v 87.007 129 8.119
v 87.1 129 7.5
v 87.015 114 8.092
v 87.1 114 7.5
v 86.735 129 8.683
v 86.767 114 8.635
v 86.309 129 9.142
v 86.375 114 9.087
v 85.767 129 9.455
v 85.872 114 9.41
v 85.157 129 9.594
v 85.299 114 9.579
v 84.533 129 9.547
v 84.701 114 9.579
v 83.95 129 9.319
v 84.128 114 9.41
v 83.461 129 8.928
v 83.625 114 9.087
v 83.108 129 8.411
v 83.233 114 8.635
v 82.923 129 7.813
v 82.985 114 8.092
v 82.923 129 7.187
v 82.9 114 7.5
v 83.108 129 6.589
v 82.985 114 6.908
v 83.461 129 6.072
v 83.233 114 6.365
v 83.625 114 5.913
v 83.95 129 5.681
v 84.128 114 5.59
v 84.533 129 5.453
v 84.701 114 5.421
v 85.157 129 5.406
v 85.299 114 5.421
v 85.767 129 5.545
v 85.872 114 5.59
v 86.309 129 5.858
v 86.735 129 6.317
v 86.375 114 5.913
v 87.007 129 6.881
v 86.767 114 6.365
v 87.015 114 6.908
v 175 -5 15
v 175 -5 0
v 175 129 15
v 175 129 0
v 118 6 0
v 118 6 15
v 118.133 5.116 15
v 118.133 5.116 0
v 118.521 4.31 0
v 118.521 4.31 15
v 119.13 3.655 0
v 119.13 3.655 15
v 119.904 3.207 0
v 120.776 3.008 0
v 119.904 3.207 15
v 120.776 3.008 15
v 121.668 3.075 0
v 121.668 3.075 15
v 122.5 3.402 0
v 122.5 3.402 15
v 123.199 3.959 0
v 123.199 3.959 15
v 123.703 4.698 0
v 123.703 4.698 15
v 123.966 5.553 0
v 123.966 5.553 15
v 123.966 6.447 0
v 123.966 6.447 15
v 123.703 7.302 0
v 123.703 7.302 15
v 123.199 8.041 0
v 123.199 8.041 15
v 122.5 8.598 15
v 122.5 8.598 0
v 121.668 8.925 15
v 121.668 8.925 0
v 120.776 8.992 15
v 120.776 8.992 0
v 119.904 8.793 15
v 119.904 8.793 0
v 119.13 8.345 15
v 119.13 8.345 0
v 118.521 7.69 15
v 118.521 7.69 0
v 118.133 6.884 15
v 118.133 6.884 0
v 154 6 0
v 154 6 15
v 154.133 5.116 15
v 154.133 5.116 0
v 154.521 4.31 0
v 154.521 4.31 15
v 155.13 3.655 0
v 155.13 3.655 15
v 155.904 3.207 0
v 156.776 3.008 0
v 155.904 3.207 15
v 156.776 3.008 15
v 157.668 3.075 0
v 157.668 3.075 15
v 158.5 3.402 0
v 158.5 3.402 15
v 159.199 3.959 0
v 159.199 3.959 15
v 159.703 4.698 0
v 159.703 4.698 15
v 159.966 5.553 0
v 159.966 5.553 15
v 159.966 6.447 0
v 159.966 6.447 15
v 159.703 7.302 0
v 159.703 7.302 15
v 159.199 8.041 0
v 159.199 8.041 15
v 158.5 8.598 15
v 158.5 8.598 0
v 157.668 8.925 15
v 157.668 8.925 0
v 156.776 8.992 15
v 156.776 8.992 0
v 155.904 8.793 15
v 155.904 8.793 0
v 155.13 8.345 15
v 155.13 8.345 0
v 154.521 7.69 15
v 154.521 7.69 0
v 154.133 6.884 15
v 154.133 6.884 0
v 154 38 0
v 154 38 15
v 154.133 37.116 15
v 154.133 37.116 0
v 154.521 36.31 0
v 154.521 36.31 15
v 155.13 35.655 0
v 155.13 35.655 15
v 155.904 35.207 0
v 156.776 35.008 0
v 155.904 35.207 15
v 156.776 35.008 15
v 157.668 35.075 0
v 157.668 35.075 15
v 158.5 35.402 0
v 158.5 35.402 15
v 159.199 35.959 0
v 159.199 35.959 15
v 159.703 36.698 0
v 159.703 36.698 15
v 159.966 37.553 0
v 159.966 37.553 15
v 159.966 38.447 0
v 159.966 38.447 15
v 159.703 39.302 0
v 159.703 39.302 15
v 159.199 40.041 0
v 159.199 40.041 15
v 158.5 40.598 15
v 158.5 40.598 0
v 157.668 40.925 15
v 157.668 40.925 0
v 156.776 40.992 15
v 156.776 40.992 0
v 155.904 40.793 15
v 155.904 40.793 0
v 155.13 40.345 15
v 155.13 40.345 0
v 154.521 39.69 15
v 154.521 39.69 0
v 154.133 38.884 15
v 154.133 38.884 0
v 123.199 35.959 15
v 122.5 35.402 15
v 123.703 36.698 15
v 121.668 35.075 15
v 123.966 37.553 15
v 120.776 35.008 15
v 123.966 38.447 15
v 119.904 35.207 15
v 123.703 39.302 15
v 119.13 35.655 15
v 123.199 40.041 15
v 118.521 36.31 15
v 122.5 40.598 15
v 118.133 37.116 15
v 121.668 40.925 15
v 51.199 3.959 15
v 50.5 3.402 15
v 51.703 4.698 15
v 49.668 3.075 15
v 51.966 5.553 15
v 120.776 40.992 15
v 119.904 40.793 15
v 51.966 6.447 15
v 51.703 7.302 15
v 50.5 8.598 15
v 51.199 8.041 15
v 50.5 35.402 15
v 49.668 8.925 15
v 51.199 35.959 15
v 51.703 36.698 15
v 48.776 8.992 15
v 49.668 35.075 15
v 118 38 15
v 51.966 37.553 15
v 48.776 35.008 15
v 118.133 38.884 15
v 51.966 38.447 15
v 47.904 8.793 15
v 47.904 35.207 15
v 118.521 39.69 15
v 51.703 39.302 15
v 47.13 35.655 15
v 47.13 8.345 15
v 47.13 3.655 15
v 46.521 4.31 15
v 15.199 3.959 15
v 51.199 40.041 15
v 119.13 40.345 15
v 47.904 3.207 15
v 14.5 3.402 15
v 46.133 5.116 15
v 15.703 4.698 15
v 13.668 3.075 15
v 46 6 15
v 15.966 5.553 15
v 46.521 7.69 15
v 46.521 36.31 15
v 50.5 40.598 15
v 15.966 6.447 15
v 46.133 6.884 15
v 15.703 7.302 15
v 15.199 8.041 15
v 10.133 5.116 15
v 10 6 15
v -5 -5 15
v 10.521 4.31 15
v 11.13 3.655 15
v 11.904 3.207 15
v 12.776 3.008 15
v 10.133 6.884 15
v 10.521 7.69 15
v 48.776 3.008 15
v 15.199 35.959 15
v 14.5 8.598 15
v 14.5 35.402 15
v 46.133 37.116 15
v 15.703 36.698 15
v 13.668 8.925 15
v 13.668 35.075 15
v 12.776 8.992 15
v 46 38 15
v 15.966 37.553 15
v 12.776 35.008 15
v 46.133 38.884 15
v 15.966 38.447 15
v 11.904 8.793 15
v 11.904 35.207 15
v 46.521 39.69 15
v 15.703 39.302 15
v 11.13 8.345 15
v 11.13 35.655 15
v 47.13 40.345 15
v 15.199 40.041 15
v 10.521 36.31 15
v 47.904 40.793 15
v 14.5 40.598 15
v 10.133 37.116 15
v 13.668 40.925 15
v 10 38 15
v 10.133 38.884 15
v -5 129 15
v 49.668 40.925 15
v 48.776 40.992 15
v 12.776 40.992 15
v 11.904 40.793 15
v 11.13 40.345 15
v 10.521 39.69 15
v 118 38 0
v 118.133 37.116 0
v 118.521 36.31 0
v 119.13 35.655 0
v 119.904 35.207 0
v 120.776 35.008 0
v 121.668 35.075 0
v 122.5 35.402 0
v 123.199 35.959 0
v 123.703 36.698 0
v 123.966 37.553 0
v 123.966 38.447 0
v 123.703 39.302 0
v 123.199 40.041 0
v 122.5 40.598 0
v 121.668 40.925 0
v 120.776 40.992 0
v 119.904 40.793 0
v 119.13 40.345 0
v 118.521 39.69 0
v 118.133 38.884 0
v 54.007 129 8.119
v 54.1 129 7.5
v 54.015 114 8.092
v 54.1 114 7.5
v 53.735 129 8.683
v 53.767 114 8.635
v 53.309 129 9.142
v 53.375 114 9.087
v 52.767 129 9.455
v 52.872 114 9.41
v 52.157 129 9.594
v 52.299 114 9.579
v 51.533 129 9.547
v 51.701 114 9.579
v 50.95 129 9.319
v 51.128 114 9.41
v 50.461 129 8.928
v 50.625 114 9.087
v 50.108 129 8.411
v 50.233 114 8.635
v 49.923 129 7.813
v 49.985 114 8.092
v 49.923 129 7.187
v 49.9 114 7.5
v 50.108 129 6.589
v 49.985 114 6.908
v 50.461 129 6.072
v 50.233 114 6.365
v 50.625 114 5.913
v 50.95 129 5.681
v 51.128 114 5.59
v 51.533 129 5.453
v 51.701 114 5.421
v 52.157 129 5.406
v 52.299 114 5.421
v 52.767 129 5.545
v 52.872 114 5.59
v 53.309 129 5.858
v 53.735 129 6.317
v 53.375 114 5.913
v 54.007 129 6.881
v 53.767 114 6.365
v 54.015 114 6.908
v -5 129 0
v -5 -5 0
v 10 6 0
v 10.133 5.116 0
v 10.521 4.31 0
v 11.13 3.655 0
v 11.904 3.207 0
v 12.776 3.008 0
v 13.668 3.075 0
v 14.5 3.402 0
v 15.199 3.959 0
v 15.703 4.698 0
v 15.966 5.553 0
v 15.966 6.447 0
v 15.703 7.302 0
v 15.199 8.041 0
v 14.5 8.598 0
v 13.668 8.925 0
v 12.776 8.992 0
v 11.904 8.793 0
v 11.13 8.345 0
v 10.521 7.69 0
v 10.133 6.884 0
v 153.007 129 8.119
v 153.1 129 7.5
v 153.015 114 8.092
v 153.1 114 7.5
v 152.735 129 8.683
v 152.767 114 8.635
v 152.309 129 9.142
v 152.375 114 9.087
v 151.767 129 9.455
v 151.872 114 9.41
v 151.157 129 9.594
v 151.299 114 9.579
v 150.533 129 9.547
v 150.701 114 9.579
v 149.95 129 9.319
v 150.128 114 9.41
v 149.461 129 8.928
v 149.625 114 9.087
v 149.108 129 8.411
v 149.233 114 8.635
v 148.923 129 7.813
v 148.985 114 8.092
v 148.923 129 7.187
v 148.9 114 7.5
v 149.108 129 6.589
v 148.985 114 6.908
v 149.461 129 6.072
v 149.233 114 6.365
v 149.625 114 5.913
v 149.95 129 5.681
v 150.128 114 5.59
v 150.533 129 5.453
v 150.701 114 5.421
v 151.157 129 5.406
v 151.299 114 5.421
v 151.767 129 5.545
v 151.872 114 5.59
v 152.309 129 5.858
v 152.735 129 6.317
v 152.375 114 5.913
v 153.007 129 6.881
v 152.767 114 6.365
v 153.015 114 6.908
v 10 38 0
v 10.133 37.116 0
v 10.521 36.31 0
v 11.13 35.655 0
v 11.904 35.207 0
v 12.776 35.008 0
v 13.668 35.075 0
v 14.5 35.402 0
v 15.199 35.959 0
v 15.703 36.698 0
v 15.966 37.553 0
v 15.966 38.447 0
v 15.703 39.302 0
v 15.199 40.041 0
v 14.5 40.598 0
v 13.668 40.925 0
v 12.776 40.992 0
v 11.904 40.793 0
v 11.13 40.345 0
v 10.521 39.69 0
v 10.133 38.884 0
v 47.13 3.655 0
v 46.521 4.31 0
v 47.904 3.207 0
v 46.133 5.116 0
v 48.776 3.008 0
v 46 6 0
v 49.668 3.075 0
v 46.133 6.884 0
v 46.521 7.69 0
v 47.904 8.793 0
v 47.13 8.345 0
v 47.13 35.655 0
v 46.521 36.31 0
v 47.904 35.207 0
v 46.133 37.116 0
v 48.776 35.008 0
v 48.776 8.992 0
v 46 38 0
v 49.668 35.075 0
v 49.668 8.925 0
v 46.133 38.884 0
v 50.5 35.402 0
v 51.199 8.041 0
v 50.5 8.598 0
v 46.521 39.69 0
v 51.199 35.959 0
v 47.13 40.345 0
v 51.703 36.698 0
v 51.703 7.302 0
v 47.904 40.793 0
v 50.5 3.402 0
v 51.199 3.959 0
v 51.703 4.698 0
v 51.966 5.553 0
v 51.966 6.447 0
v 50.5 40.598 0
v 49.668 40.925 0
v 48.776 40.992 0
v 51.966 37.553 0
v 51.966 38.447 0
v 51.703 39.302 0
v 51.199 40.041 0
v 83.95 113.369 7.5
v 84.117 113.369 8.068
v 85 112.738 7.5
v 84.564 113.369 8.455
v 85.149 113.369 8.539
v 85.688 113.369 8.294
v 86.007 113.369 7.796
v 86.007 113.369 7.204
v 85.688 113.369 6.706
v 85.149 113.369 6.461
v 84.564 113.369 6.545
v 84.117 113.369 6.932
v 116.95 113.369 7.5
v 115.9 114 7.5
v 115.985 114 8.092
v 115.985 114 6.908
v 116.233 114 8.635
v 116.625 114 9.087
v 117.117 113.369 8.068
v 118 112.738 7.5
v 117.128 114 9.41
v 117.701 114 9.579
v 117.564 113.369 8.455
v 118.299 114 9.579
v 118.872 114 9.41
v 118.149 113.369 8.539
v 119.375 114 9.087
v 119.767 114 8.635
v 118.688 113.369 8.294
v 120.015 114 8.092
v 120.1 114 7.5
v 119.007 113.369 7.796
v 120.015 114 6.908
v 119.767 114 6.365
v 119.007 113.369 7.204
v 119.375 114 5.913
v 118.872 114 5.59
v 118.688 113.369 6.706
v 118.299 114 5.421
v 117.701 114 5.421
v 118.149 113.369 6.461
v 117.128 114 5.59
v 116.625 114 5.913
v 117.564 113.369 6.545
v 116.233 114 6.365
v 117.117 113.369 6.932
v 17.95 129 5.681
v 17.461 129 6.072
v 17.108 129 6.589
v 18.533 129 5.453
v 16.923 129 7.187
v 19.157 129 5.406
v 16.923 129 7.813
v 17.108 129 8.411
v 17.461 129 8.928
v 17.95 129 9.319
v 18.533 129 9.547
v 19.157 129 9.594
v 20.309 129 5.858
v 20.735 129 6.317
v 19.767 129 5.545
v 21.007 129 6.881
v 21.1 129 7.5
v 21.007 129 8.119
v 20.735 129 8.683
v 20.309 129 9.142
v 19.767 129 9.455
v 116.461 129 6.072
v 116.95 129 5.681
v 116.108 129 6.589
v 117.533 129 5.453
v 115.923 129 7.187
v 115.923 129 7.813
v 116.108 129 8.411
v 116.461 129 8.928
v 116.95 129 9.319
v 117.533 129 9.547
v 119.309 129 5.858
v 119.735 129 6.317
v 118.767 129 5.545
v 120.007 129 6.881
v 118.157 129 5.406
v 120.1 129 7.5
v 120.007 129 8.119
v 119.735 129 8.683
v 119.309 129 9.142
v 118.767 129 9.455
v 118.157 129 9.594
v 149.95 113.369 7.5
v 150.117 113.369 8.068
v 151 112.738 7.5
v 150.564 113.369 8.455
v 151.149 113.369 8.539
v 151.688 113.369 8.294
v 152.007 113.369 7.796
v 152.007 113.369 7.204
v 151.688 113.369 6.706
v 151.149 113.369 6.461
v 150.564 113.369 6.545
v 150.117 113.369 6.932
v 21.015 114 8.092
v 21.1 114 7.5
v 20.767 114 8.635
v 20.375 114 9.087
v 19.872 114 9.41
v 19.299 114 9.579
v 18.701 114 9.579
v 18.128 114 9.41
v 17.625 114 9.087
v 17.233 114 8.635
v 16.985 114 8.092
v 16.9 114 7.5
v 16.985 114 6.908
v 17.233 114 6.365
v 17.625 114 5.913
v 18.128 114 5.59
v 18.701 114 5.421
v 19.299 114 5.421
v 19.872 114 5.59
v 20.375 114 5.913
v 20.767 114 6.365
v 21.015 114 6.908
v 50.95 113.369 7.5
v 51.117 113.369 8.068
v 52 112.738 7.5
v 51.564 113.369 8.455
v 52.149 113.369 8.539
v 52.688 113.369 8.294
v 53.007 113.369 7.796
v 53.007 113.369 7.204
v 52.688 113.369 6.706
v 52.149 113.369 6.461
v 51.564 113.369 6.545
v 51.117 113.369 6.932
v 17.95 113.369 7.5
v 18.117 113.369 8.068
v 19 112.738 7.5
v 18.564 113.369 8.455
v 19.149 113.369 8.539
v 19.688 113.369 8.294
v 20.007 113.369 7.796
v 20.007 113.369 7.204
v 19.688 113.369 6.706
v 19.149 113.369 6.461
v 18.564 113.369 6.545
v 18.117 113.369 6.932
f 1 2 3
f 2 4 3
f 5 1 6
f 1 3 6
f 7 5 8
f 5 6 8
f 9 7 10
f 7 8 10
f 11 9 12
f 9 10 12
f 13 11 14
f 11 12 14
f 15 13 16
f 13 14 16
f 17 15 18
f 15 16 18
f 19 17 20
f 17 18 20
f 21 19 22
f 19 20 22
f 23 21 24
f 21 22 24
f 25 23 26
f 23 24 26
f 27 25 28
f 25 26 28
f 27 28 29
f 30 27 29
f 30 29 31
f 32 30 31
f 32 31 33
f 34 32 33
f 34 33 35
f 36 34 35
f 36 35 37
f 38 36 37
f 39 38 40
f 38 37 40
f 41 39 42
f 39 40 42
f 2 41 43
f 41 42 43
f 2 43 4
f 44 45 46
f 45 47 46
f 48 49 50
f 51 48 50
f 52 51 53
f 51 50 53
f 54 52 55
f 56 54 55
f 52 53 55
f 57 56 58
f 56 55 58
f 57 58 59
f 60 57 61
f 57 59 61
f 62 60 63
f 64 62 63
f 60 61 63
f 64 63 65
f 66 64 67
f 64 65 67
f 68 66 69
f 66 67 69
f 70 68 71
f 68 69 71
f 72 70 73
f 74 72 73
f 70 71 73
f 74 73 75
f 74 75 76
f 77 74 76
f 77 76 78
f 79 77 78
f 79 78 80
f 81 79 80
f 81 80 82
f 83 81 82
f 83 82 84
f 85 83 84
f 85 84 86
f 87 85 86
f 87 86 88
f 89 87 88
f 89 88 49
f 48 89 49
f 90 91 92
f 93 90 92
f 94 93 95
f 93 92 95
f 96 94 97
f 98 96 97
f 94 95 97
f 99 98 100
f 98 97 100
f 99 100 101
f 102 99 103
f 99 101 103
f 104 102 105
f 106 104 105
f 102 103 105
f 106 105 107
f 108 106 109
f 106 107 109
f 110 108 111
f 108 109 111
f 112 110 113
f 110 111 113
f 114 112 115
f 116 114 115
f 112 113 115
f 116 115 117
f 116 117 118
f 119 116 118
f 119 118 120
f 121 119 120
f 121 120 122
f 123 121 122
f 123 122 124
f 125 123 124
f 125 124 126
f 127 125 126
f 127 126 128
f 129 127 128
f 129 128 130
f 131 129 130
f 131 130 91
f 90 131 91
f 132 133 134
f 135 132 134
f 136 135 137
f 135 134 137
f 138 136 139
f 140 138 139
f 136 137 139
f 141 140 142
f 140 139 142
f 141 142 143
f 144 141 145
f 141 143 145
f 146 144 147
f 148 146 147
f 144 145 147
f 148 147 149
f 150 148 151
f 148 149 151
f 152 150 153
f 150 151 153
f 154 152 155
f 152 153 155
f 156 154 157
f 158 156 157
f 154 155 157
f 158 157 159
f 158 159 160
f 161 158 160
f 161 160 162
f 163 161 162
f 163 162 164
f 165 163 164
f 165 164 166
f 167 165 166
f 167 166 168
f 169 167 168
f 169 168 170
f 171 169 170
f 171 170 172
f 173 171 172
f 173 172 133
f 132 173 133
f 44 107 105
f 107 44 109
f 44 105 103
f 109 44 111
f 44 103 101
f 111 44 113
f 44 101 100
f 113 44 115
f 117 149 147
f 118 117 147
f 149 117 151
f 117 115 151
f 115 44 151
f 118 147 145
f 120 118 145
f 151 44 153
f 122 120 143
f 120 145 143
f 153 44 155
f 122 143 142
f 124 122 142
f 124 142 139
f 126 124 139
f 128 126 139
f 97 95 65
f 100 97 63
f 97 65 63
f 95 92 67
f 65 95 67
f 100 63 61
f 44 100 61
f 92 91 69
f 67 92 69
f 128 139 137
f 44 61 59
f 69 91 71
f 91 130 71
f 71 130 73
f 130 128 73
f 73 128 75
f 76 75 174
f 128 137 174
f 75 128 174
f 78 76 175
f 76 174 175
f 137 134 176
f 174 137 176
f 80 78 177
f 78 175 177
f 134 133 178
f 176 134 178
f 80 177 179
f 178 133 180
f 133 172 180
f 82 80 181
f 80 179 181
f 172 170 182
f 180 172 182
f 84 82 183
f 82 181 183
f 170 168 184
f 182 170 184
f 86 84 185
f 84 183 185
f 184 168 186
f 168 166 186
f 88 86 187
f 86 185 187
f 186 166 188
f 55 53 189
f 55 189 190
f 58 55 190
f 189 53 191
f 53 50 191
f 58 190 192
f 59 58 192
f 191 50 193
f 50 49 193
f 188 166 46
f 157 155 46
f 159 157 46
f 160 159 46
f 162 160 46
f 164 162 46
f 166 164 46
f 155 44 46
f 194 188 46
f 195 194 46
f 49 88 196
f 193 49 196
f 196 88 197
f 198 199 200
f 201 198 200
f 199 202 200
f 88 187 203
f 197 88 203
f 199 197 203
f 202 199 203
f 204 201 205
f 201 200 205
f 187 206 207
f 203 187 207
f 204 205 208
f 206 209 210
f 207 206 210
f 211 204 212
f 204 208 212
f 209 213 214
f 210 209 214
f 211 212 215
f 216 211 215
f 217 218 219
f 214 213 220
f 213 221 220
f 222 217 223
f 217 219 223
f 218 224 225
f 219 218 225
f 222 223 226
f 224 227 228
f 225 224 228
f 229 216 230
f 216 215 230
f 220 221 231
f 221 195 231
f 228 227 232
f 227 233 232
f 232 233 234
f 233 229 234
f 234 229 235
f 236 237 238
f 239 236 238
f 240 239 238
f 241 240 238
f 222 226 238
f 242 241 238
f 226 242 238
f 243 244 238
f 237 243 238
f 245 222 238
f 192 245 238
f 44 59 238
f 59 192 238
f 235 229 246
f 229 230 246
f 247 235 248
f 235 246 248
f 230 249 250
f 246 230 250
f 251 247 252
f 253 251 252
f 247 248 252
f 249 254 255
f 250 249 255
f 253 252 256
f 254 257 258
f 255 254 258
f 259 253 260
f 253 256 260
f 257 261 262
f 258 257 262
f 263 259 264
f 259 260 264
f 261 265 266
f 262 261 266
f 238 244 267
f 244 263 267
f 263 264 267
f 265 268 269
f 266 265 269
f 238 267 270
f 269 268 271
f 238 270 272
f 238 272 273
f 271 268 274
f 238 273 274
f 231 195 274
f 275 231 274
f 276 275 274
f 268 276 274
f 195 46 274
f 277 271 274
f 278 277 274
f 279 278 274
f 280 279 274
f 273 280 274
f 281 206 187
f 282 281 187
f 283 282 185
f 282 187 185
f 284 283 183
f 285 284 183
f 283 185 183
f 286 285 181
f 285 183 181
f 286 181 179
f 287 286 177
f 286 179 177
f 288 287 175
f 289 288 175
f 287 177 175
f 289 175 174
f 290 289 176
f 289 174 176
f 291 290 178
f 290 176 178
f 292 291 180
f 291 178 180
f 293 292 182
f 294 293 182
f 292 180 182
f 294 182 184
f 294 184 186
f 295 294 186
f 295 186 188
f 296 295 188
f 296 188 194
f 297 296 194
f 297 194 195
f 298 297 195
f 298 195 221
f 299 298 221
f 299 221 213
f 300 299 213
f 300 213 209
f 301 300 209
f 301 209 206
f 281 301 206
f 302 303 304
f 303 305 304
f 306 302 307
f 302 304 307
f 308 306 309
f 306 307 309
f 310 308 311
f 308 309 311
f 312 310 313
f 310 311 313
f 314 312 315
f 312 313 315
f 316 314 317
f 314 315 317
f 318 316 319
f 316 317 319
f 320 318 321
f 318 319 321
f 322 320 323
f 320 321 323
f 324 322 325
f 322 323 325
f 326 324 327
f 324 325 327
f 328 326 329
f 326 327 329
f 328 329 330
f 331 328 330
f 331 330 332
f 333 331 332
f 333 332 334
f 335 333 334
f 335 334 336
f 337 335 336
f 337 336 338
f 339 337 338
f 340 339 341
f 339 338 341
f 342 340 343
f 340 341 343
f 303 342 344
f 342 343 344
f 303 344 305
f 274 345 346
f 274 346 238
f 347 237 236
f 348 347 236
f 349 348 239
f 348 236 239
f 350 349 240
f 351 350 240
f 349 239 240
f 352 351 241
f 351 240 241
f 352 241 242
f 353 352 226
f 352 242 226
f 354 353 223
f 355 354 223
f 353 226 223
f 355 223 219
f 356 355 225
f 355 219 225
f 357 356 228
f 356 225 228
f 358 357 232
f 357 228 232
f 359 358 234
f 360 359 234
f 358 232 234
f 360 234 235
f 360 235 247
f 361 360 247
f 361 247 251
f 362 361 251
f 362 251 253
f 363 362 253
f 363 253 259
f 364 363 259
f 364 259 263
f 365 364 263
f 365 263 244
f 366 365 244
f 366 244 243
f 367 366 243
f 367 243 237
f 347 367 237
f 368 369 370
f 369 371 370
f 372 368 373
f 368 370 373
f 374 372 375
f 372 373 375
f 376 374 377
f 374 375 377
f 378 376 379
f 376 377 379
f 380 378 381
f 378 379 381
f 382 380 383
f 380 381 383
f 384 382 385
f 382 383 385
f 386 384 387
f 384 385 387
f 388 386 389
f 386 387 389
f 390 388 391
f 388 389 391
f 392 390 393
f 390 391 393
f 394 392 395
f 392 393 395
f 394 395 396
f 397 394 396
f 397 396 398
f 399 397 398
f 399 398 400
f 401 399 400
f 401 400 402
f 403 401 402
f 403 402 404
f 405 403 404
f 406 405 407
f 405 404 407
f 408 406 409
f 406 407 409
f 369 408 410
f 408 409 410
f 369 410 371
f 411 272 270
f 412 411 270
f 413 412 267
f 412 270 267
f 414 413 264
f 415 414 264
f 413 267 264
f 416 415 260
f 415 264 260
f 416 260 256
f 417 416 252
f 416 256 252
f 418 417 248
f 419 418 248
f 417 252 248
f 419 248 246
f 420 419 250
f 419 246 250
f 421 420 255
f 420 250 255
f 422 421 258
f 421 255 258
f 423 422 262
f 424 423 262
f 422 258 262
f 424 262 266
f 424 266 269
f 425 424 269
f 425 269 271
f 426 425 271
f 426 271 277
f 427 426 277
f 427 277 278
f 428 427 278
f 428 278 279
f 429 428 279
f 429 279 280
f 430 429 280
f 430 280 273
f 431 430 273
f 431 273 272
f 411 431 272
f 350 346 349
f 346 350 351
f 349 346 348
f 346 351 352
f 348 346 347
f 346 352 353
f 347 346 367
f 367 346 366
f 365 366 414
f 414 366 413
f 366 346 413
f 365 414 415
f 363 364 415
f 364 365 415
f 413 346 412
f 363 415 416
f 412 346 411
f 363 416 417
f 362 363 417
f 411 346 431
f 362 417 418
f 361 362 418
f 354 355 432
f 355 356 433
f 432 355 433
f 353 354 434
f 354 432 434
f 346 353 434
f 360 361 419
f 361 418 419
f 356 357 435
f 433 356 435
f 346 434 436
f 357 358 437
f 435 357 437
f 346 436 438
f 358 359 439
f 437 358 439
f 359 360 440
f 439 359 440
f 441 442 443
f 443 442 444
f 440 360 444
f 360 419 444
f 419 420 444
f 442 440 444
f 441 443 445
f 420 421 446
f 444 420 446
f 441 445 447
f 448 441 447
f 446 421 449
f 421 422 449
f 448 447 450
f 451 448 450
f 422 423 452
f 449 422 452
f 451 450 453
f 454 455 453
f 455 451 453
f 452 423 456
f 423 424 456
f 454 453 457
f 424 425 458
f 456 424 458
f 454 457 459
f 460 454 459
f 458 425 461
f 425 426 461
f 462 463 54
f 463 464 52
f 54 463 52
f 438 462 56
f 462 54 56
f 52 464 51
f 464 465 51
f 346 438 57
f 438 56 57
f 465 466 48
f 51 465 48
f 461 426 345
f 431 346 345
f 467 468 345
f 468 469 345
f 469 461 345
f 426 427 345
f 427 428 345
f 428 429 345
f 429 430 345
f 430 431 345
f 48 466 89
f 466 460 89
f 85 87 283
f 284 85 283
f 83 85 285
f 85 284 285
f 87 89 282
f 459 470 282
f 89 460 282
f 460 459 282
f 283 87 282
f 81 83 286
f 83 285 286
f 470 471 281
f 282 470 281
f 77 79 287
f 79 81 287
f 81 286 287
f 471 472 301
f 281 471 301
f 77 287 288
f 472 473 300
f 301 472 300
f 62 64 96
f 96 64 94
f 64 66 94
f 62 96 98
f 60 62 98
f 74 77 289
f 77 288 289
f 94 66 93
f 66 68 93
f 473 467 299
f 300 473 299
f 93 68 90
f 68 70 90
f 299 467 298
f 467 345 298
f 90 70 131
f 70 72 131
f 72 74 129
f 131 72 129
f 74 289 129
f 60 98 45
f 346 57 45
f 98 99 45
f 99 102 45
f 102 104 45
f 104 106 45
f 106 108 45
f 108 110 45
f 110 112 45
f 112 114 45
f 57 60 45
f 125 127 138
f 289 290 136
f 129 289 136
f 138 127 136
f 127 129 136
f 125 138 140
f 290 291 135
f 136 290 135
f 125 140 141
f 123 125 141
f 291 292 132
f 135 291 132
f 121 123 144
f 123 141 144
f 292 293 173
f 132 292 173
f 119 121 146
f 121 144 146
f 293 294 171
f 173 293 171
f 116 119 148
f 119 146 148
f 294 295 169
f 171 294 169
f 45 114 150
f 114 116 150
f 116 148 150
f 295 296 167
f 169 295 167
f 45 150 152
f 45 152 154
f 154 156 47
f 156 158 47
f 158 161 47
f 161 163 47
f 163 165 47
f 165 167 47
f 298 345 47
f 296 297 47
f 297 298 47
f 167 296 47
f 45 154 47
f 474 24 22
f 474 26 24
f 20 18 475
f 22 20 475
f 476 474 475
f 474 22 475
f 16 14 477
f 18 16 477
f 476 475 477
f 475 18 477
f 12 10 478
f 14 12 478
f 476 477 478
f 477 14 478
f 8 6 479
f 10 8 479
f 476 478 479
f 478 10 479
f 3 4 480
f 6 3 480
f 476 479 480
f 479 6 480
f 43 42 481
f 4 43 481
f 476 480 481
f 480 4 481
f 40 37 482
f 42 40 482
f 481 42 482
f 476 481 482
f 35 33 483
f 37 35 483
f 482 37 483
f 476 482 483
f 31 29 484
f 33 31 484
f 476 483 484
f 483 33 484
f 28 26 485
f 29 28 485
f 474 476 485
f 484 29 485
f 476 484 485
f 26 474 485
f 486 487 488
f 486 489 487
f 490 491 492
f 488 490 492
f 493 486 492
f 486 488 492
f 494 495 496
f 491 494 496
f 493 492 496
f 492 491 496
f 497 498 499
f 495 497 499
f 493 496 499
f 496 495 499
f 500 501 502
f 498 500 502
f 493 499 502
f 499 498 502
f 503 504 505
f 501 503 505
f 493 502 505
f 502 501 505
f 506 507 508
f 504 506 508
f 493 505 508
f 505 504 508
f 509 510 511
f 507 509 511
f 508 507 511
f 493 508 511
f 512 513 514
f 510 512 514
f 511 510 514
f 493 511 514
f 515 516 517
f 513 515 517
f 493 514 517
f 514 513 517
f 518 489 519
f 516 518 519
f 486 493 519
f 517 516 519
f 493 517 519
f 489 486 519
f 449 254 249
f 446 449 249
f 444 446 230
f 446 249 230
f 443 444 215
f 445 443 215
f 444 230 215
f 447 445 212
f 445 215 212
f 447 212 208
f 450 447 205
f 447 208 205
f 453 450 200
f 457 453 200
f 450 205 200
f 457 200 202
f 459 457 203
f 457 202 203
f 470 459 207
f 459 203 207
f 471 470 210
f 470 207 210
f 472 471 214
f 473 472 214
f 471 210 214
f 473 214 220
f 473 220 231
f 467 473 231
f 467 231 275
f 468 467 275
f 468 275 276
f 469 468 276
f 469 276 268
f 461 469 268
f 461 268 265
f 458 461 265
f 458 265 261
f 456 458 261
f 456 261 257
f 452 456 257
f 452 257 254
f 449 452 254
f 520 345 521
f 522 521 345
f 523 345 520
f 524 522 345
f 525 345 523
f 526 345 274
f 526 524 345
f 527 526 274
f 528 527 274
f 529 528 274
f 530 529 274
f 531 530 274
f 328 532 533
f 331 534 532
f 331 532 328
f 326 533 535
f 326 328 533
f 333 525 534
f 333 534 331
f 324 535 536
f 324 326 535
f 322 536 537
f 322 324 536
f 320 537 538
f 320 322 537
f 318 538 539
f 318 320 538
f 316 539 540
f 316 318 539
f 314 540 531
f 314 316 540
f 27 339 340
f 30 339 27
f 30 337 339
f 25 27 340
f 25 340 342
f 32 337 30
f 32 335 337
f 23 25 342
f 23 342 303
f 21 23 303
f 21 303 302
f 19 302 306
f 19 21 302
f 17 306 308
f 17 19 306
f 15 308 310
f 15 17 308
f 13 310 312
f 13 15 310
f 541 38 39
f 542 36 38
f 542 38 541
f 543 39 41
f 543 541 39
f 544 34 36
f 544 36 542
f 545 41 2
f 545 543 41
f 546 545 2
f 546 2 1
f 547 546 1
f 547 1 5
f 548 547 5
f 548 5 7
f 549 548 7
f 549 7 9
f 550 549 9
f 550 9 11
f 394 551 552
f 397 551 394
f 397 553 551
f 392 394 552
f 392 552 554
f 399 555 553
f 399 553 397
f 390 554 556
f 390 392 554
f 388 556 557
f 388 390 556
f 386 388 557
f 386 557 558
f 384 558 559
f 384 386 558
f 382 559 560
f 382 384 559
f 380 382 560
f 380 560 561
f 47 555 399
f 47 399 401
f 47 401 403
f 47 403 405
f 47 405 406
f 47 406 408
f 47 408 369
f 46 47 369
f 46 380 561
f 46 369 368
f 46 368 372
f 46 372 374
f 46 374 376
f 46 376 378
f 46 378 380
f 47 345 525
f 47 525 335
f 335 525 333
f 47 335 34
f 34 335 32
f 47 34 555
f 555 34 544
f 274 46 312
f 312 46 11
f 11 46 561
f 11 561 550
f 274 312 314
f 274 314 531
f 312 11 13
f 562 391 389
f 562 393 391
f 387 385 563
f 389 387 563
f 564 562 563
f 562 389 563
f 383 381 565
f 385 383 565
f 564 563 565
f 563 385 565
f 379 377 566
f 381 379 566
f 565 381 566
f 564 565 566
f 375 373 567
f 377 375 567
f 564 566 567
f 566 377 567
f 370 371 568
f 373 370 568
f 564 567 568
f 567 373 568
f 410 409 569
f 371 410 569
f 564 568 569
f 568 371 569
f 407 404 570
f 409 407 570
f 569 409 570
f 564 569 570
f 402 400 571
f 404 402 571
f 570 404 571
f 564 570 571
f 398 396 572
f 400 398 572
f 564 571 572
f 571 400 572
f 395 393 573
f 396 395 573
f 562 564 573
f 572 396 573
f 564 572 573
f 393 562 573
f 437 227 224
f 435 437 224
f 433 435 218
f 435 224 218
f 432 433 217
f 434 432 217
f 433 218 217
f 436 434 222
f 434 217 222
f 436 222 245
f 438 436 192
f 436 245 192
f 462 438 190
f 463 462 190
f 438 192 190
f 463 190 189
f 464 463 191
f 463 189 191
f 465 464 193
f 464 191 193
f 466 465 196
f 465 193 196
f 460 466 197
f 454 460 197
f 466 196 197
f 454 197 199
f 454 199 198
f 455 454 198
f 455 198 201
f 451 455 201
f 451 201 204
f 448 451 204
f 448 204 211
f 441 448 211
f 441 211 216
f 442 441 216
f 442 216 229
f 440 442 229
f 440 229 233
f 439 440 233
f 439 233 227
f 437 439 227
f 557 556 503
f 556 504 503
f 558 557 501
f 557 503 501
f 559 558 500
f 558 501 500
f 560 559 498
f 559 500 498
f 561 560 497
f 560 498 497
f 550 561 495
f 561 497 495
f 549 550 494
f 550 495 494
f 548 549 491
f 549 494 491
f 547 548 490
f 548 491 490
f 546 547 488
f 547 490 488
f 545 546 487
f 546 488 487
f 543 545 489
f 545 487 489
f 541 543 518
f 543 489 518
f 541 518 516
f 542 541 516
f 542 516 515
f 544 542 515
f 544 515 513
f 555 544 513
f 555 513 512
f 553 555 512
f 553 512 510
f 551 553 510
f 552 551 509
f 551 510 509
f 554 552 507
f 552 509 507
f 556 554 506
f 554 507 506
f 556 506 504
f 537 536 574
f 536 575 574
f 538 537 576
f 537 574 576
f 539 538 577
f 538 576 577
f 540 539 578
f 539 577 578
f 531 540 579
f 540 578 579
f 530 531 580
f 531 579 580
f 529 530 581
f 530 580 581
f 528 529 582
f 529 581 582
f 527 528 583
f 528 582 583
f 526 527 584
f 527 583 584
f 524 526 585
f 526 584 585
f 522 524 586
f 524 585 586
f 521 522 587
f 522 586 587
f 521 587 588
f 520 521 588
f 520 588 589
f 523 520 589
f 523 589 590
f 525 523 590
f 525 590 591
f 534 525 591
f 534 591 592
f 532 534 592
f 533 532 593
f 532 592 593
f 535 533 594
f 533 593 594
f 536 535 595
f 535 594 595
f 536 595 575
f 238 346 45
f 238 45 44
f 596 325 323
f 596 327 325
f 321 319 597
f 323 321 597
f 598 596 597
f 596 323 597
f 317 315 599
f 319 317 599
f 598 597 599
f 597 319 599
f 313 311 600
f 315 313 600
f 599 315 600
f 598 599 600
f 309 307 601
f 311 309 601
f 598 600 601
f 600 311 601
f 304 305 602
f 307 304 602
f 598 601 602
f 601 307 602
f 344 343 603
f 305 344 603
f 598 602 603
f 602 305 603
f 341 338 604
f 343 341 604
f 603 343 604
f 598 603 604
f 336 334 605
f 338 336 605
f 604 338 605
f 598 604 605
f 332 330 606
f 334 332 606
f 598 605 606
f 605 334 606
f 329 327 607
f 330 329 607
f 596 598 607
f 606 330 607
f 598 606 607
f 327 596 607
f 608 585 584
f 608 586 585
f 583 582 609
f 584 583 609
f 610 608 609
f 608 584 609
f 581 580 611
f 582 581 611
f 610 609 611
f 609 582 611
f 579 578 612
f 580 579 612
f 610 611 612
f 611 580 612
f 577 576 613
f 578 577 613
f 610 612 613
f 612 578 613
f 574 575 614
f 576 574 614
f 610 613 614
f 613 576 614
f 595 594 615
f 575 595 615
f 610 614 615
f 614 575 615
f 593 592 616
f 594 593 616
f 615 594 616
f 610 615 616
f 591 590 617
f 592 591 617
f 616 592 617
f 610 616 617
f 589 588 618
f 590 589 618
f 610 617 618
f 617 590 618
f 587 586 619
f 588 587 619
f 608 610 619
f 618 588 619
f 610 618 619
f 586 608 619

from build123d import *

# Parameters (mm, degrees)
F0_W     = 129
F0_H     = 15
F1_DEPTH = 170
F3_D     = 6
F5_D     = 4.2
F5_DEPTH = 15
F5_TIP   = 1.2618073
F6_DEPTH = 5
F7_DEPTH = 5
F8_DEPTH = 5


with BuildPart() as f1:
    # F0 (on Right) → F1 (new body)
    with BuildSketch(Plane.YZ):
        with Locations((64.5, 7.5)):
            Rectangle(F0_W, F0_H)
    extrude(amount=F1_DEPTH)

    # F3 (through all)
    with Locations(Plane(origin=(0, 0, 0), x_dir=(1, 0, 0), z_dir=(0, 0, -1))):
        with Locations((13, -6), (13, -38), (49, -6), (49, -38), (121, -38), (121, -6), (157, -6), (157, -38)):
            Hole(F3_D / 2)

    # F5
    with Locations(Plane(origin=(0, 129, 0), x_dir=(-1, 0, 0), z_dir=(0, 1, 0))):
        with Locations((-151, 7.5), (-85, 7.5), (-118, 7.5), (-52, 7.5), (-19, 7.5)):
            Hole(F5_D / 2, depth=F5_DEPTH)
            with Locations((0, 0, -(F5_DEPTH + F5_TIP / 2))):  # 118° drill point
                Cone(0, F5_D / 2, F5_TIP, mode=Mode.SUBTRACT)

    # F6 (add): a face of the model
    f6_faces = [f1.faces().sort_by_distance(p)[0] for p in [
        (170, 64.5, 7.5),
    ]]
    extrude(f6_faces, amount=F6_DEPTH)

    # F7 (add): a face of the model
    f7_faces = [f1.faces().sort_by_distance(p)[0] for p in [
        (0, 64.5, 7.5),
    ]]
    extrude(f7_faces, amount=F7_DEPTH)

    # F8 (add): a face of the model
    f8_faces = [f1.faces().sort_by_distance(p)[0] for p in [
        (85, 0, 7.5),
    ]]
    extrude(f8_faces, amount=F8_DEPTH)


solid = f1.part
